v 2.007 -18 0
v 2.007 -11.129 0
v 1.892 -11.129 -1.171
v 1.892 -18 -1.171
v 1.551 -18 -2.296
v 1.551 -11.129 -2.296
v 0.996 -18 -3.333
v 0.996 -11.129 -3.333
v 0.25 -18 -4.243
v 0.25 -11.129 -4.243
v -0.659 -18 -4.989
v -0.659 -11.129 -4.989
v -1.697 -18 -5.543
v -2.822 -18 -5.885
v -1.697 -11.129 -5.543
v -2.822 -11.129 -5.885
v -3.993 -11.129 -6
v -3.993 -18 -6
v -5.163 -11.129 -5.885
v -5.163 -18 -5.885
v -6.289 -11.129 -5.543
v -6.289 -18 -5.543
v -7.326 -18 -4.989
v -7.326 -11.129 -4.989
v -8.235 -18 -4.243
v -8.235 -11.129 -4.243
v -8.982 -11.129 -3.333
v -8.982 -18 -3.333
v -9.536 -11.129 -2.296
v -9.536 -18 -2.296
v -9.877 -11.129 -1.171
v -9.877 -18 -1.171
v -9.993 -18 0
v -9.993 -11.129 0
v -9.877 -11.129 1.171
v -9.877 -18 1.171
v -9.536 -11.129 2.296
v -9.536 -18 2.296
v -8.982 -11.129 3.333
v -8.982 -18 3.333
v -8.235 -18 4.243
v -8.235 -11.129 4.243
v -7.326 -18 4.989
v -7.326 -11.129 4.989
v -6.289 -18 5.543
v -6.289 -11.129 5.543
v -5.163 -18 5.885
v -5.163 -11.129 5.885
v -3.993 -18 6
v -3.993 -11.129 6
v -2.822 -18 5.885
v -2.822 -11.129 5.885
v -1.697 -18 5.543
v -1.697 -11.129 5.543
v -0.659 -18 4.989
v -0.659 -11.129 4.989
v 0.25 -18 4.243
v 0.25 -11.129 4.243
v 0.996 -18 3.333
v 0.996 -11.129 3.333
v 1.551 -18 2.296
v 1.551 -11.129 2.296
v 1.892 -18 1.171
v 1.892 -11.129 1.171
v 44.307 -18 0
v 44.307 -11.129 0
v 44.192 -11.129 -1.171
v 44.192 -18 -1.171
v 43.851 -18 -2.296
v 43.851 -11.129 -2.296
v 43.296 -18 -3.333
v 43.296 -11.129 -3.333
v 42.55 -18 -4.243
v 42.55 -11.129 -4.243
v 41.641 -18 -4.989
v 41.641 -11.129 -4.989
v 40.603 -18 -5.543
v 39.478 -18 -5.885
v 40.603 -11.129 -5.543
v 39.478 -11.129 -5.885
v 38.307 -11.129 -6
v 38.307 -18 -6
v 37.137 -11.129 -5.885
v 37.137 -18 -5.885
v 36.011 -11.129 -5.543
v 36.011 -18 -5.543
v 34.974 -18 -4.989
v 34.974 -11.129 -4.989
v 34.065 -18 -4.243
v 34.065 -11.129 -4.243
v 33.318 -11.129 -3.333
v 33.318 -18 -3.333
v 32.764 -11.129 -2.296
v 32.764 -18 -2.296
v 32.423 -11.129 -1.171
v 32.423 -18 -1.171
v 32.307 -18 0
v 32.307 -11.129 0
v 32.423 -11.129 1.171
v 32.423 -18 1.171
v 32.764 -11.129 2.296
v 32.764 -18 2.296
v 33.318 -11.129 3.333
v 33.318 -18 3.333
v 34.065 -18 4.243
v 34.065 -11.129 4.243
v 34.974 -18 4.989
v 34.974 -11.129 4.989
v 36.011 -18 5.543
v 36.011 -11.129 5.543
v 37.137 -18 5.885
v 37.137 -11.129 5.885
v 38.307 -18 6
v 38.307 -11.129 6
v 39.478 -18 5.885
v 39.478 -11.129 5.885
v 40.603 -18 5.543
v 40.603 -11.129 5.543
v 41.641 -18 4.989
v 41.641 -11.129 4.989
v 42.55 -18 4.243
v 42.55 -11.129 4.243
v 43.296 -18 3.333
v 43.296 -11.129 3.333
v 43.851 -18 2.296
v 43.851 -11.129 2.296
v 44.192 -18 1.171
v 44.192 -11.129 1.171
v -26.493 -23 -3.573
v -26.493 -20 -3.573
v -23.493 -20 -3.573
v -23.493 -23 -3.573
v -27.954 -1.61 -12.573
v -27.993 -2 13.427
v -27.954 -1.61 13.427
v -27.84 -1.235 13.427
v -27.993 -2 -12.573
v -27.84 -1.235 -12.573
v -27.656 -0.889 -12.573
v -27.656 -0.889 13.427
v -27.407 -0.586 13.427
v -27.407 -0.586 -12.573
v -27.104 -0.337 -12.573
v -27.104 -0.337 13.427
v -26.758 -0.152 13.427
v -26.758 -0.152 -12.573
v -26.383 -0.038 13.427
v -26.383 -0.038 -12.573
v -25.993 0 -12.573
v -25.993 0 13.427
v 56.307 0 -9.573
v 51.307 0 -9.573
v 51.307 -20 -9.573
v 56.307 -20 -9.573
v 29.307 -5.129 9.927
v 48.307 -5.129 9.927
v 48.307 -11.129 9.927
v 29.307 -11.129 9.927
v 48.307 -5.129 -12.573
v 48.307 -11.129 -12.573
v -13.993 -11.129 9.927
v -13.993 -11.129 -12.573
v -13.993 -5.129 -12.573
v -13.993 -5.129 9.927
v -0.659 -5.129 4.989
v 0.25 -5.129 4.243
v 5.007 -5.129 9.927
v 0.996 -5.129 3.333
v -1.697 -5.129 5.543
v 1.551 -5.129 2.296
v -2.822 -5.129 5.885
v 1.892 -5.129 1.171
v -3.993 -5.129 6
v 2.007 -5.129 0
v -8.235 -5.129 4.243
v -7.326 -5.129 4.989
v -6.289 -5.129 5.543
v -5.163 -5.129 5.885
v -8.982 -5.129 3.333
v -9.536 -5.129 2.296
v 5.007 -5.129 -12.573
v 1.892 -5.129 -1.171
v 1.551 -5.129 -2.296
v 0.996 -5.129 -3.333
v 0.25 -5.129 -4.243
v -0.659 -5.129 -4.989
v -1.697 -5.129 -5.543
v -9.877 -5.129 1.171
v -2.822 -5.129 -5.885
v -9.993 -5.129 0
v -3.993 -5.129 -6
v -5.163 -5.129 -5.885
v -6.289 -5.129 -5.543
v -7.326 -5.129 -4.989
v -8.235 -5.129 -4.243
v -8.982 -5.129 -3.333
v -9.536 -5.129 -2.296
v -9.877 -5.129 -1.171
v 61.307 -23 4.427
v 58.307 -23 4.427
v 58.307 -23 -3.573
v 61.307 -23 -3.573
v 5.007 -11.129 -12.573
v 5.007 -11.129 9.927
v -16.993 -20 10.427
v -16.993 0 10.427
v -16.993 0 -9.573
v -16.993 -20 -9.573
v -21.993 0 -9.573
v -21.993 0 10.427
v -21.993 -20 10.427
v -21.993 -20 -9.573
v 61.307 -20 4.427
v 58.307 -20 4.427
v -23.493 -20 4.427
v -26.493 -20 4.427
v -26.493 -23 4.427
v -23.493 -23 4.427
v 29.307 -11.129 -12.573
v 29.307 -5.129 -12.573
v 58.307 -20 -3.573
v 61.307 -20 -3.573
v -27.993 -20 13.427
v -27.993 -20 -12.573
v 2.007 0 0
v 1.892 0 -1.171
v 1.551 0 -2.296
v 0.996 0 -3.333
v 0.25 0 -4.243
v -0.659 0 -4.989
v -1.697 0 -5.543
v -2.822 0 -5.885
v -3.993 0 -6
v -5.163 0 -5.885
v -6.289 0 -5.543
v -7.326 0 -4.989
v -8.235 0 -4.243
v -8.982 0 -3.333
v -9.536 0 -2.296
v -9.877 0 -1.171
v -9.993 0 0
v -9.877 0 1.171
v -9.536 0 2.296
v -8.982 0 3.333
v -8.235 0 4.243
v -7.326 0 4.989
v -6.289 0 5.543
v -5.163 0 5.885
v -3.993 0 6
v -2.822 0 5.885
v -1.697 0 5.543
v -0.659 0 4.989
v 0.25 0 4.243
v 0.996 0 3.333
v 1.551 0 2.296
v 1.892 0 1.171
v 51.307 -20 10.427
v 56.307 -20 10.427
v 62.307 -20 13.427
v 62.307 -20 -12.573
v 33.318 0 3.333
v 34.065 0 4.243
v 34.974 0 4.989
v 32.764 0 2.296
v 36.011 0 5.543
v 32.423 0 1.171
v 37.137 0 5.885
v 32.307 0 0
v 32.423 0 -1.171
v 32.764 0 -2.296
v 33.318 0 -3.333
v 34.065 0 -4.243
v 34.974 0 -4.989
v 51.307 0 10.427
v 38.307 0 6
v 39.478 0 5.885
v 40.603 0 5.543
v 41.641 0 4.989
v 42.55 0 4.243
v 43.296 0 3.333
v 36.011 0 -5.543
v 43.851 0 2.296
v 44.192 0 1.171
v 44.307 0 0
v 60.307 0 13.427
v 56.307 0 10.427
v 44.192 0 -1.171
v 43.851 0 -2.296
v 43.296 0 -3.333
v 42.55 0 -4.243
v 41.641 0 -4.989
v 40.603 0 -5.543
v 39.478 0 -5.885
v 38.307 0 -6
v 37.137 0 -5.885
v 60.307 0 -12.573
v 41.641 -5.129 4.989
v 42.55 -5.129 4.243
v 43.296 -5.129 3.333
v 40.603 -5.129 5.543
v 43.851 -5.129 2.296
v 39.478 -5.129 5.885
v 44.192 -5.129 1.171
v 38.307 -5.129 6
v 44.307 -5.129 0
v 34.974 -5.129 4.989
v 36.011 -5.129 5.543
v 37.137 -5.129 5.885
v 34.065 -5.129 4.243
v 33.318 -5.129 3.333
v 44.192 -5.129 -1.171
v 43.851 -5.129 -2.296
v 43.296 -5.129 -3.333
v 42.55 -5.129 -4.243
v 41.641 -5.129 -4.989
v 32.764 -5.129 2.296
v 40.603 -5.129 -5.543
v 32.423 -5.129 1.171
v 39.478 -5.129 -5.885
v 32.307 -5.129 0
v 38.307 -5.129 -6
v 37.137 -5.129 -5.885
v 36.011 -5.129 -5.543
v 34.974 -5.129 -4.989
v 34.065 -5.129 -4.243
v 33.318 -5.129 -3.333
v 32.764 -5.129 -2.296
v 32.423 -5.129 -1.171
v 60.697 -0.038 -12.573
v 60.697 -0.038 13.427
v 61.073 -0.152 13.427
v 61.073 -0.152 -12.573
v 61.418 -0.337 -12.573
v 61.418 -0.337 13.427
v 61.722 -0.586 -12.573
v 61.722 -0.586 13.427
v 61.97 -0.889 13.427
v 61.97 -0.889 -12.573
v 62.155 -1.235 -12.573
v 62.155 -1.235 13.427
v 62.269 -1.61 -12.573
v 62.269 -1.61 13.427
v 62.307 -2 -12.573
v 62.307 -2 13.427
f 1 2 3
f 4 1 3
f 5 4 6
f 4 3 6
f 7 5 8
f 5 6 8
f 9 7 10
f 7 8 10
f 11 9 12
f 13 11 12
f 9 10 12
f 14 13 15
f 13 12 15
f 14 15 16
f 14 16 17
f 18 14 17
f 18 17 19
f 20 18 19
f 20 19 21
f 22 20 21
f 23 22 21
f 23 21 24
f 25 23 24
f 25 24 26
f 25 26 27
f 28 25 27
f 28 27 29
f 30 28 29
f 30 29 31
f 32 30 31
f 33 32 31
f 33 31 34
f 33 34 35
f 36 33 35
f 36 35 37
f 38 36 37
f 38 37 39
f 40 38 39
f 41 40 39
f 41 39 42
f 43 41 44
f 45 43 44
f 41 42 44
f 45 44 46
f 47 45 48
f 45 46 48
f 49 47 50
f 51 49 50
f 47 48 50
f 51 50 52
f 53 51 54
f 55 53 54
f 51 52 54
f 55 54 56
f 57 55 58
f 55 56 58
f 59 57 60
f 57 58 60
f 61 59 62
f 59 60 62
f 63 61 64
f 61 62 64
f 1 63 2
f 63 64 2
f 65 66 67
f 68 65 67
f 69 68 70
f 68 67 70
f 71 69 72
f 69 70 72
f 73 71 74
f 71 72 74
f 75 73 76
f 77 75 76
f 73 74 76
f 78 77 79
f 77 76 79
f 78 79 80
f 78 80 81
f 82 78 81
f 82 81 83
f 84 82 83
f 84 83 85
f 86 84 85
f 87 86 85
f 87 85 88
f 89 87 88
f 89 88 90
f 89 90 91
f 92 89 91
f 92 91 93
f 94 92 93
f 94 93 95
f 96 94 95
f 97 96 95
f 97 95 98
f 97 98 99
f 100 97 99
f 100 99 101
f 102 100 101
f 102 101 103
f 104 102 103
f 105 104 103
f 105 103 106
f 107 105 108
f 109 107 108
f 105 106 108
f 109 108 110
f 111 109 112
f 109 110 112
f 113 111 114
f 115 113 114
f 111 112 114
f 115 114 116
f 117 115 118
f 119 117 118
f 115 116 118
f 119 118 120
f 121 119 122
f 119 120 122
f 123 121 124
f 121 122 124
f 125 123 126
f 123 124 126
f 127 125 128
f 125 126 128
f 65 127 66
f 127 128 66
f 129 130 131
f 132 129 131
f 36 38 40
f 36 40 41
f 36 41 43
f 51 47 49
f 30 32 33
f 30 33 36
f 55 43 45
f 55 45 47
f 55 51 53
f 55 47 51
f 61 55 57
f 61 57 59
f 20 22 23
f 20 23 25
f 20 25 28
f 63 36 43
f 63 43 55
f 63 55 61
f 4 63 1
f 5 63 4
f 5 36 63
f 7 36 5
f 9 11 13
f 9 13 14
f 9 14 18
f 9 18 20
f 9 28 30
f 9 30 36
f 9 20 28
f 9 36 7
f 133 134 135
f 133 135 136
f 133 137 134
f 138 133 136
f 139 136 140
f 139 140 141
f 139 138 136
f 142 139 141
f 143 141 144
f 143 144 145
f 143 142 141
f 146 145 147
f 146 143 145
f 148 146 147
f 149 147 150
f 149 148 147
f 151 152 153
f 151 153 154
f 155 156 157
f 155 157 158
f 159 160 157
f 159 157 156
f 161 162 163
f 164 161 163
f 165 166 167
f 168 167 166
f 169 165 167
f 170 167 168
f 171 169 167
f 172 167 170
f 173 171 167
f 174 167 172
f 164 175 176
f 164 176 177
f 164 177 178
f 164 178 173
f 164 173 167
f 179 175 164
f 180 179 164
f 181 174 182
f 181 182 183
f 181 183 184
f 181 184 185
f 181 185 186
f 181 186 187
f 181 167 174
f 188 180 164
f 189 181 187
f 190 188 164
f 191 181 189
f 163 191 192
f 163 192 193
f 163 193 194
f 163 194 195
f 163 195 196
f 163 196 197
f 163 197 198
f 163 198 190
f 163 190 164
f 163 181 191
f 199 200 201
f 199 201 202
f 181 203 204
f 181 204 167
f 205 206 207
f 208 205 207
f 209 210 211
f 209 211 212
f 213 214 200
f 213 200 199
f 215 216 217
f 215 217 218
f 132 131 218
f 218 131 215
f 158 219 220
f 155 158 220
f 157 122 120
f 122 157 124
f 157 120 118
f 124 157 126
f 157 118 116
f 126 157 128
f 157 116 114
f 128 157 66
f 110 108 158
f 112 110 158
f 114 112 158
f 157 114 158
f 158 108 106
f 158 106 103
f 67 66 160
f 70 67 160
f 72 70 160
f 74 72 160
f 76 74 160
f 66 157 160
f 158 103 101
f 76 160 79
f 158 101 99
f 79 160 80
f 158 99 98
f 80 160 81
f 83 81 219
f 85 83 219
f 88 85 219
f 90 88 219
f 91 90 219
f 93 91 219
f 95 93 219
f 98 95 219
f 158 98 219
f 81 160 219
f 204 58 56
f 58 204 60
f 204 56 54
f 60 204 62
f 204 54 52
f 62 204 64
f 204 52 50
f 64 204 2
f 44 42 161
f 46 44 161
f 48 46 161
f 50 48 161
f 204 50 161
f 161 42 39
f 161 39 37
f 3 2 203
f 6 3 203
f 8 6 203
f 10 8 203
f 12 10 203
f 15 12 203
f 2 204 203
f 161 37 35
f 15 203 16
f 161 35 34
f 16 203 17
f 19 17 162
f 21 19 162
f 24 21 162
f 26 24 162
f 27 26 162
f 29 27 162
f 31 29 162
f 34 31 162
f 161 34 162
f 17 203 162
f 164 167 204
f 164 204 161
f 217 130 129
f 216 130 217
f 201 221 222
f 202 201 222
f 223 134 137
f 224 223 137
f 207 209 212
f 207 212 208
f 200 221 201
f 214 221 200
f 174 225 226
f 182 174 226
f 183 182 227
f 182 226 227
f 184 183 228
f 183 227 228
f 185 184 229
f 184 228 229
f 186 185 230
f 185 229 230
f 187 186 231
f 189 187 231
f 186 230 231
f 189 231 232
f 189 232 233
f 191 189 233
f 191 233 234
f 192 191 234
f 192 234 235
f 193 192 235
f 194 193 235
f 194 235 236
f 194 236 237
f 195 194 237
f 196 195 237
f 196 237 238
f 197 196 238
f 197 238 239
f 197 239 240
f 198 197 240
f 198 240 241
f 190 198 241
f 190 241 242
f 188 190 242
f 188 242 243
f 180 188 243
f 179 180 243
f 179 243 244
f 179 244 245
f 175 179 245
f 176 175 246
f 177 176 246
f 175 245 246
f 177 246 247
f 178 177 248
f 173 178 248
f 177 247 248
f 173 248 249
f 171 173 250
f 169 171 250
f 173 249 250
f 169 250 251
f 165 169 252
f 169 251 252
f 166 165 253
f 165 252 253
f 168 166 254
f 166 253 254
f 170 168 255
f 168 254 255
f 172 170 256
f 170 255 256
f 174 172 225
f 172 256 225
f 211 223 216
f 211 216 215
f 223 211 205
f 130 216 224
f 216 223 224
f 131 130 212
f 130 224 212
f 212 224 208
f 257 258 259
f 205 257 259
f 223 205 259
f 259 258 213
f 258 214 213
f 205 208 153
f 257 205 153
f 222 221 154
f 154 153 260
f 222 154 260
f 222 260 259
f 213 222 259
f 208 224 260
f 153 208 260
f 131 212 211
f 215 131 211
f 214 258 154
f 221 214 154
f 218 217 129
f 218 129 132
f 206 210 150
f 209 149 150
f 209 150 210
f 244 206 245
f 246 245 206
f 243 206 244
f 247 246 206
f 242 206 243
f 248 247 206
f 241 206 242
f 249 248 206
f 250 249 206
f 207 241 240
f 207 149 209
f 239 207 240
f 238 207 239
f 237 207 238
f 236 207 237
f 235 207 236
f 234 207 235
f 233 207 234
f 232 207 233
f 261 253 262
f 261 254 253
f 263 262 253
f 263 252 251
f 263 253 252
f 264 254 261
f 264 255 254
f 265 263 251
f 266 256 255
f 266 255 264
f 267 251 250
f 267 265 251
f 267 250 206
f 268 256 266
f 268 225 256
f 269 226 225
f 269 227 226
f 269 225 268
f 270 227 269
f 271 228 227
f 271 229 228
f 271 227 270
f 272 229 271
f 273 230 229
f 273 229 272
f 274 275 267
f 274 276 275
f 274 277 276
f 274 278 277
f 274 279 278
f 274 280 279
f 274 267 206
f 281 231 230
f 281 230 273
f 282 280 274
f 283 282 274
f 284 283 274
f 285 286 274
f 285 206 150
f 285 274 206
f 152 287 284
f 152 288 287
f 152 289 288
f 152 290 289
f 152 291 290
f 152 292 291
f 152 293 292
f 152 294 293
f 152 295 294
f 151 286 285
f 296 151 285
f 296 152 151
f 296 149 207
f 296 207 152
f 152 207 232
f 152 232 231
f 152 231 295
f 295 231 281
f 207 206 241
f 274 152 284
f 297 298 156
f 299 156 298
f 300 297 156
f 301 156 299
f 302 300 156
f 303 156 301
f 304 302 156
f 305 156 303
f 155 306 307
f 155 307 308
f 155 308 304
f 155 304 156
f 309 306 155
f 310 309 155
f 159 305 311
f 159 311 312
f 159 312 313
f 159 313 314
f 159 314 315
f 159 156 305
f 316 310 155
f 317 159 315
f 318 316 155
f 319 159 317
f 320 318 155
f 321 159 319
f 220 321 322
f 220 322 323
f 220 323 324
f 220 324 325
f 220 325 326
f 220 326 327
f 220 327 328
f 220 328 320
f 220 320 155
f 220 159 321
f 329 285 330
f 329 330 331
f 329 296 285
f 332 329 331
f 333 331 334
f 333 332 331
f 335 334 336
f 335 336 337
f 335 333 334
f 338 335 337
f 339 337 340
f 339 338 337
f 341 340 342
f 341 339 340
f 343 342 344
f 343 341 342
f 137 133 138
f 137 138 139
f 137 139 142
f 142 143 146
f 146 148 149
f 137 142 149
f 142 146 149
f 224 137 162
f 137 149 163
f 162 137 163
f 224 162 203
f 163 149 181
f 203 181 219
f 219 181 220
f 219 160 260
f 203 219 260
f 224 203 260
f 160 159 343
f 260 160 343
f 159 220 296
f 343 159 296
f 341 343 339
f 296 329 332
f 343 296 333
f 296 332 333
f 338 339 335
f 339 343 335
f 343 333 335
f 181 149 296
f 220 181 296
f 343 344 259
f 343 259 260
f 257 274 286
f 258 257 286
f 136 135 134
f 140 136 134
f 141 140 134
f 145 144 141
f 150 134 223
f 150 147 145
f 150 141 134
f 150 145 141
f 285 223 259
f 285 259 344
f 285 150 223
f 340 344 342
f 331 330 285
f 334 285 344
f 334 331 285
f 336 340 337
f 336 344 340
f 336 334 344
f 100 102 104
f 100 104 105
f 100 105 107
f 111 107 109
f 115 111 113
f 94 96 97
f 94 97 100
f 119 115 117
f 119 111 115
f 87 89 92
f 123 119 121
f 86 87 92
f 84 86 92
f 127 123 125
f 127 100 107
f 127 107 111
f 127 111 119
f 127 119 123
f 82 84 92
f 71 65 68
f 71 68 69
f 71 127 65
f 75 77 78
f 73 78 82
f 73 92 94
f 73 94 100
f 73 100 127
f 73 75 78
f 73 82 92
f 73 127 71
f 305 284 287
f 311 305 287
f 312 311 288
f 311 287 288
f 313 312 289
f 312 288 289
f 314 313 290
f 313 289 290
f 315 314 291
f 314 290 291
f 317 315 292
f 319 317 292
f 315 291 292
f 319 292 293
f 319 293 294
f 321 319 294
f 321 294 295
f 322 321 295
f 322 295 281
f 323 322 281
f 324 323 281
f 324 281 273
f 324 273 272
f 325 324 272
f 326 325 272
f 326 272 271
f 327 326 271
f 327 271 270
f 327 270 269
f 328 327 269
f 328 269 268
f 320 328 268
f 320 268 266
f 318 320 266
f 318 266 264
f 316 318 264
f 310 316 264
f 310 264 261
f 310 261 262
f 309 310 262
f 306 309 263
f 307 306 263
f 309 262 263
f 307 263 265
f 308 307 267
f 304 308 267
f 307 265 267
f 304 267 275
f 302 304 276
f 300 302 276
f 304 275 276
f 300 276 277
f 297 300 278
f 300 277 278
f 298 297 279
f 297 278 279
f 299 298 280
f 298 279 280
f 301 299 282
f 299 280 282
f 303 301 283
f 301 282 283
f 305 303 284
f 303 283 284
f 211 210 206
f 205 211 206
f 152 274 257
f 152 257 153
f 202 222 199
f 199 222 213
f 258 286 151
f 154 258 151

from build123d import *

# Parameters (mm, degrees)
SKETCH1_W           = 90.3
SKETCH1_H           = 26
BOSS_EXTRUDE1_DEPTH = 20
SKETCH2_W           = 5
SKETCH2_H           = 20
CUT_EXTRUDE1_DEPTH  = 21
LPATTERN1_COUNT     = 2
LPATTERN1_PITCH     = 73.3
SKETCH3_R           = 6
CUT_EXTRUDE2_DEPTH  = 18
SKETCH4_W           = 19
SKETCH4_H           = 6
CUT_EXTRUDE3_DEPTH  = 22.5
SKETCH5_W           = 3
SKETCH5_H           = 8
BOSS_EXTRUDE2_DEPTH = 3
FILLET1_R           = 2


with BuildPart() as part:
    # Sketch1 → Boss-Extrude1 (new body)
    with BuildSketch(Plane(origin=(0, 0, 0), x_dir=(1, 0, 0), z_dir=(0, 1, 0))):
        with Locations((17.15729927, -0.427007299)):
            Rectangle(SKETCH1_W, SKETCH1_H)
    extrude(amount=-BOSS_EXTRUDE1_DEPTH)

    # Sketch2 → Cut-Extrude1 (cut, through all)
    with BuildSketch(Plane(origin=(0, 0, 0), x_dir=(1, 0, 0), z_dir=(0, 1, 0))):
        with Locations((53.80729927, -0.427007299)):
            Rectangle(SKETCH2_W, SKETCH2_H)
    cut_extrude1 = extrude(amount=-CUT_EXTRUDE1_DEPTH, mode=Mode.SUBTRACT)

    # LPattern1: Cut-Extrude1 ×2
    with Locations(*[(-i * LPATTERN1_PITCH, 0, 0) for i in range(1, LPATTERN1_COUNT)]):
        add(cut_extrude1, mode=Mode.SUBTRACT)

    # Sketch3 → Cut-Extrude2 (cut)
    with BuildSketch(Plane(origin=(0, 0, 0), x_dir=(1, 0, 0), z_dir=(0, 1, 0))):
        with Locations((38.30729927, 0)):
            Circle(SKETCH3_R)
        with Locations((-3.99270073, 0)):
            Circle(SKETCH3_R)
    extrude(amount=-CUT_EXTRUDE2_DEPTH, mode=Mode.SUBTRACT)

    # Sketch4 → Cut-Extrude3 (cut)
    with BuildSketch(Plane(origin=(0, 0, -12.572992701), x_dir=(-1, 0, 0), z_dir=(0, 0, -1))):
        with Locations((-38.80729927, -8.129091999)):
            Rectangle(SKETCH4_W, SKETCH4_H)
        with Locations((4.49270073, -8.129091999)):
            Rectangle(SKETCH4_W, SKETCH4_H)
    extrude(amount=-CUT_EXTRUDE3_DEPTH, mode=Mode.SUBTRACT)

    # Sketch5 → Boss-Extrude2 (add)
    with BuildSketch(Plane.XZ.offset(20)):
        with Locations((59.80729927, 0.427007299)):
            Rectangle(SKETCH5_W, SKETCH5_H)
        with Locations((-24.99270073, 0.427007299)):
            Rectangle(SKETCH5_W, SKETCH5_H)
    extrude(amount=BOSS_EXTRUDE2_DEPTH)

    # Fillet1
    fillet1_edges = [part.edges().sort_by_distance(p)[0] for p in [
        (62.30729927, 0, 0.427007299),
        (-27.99270073, 0, 0.427007299),
    ]]
    fillet(fillet1_edges, radius=FILLET1_R)


solid = part.part
